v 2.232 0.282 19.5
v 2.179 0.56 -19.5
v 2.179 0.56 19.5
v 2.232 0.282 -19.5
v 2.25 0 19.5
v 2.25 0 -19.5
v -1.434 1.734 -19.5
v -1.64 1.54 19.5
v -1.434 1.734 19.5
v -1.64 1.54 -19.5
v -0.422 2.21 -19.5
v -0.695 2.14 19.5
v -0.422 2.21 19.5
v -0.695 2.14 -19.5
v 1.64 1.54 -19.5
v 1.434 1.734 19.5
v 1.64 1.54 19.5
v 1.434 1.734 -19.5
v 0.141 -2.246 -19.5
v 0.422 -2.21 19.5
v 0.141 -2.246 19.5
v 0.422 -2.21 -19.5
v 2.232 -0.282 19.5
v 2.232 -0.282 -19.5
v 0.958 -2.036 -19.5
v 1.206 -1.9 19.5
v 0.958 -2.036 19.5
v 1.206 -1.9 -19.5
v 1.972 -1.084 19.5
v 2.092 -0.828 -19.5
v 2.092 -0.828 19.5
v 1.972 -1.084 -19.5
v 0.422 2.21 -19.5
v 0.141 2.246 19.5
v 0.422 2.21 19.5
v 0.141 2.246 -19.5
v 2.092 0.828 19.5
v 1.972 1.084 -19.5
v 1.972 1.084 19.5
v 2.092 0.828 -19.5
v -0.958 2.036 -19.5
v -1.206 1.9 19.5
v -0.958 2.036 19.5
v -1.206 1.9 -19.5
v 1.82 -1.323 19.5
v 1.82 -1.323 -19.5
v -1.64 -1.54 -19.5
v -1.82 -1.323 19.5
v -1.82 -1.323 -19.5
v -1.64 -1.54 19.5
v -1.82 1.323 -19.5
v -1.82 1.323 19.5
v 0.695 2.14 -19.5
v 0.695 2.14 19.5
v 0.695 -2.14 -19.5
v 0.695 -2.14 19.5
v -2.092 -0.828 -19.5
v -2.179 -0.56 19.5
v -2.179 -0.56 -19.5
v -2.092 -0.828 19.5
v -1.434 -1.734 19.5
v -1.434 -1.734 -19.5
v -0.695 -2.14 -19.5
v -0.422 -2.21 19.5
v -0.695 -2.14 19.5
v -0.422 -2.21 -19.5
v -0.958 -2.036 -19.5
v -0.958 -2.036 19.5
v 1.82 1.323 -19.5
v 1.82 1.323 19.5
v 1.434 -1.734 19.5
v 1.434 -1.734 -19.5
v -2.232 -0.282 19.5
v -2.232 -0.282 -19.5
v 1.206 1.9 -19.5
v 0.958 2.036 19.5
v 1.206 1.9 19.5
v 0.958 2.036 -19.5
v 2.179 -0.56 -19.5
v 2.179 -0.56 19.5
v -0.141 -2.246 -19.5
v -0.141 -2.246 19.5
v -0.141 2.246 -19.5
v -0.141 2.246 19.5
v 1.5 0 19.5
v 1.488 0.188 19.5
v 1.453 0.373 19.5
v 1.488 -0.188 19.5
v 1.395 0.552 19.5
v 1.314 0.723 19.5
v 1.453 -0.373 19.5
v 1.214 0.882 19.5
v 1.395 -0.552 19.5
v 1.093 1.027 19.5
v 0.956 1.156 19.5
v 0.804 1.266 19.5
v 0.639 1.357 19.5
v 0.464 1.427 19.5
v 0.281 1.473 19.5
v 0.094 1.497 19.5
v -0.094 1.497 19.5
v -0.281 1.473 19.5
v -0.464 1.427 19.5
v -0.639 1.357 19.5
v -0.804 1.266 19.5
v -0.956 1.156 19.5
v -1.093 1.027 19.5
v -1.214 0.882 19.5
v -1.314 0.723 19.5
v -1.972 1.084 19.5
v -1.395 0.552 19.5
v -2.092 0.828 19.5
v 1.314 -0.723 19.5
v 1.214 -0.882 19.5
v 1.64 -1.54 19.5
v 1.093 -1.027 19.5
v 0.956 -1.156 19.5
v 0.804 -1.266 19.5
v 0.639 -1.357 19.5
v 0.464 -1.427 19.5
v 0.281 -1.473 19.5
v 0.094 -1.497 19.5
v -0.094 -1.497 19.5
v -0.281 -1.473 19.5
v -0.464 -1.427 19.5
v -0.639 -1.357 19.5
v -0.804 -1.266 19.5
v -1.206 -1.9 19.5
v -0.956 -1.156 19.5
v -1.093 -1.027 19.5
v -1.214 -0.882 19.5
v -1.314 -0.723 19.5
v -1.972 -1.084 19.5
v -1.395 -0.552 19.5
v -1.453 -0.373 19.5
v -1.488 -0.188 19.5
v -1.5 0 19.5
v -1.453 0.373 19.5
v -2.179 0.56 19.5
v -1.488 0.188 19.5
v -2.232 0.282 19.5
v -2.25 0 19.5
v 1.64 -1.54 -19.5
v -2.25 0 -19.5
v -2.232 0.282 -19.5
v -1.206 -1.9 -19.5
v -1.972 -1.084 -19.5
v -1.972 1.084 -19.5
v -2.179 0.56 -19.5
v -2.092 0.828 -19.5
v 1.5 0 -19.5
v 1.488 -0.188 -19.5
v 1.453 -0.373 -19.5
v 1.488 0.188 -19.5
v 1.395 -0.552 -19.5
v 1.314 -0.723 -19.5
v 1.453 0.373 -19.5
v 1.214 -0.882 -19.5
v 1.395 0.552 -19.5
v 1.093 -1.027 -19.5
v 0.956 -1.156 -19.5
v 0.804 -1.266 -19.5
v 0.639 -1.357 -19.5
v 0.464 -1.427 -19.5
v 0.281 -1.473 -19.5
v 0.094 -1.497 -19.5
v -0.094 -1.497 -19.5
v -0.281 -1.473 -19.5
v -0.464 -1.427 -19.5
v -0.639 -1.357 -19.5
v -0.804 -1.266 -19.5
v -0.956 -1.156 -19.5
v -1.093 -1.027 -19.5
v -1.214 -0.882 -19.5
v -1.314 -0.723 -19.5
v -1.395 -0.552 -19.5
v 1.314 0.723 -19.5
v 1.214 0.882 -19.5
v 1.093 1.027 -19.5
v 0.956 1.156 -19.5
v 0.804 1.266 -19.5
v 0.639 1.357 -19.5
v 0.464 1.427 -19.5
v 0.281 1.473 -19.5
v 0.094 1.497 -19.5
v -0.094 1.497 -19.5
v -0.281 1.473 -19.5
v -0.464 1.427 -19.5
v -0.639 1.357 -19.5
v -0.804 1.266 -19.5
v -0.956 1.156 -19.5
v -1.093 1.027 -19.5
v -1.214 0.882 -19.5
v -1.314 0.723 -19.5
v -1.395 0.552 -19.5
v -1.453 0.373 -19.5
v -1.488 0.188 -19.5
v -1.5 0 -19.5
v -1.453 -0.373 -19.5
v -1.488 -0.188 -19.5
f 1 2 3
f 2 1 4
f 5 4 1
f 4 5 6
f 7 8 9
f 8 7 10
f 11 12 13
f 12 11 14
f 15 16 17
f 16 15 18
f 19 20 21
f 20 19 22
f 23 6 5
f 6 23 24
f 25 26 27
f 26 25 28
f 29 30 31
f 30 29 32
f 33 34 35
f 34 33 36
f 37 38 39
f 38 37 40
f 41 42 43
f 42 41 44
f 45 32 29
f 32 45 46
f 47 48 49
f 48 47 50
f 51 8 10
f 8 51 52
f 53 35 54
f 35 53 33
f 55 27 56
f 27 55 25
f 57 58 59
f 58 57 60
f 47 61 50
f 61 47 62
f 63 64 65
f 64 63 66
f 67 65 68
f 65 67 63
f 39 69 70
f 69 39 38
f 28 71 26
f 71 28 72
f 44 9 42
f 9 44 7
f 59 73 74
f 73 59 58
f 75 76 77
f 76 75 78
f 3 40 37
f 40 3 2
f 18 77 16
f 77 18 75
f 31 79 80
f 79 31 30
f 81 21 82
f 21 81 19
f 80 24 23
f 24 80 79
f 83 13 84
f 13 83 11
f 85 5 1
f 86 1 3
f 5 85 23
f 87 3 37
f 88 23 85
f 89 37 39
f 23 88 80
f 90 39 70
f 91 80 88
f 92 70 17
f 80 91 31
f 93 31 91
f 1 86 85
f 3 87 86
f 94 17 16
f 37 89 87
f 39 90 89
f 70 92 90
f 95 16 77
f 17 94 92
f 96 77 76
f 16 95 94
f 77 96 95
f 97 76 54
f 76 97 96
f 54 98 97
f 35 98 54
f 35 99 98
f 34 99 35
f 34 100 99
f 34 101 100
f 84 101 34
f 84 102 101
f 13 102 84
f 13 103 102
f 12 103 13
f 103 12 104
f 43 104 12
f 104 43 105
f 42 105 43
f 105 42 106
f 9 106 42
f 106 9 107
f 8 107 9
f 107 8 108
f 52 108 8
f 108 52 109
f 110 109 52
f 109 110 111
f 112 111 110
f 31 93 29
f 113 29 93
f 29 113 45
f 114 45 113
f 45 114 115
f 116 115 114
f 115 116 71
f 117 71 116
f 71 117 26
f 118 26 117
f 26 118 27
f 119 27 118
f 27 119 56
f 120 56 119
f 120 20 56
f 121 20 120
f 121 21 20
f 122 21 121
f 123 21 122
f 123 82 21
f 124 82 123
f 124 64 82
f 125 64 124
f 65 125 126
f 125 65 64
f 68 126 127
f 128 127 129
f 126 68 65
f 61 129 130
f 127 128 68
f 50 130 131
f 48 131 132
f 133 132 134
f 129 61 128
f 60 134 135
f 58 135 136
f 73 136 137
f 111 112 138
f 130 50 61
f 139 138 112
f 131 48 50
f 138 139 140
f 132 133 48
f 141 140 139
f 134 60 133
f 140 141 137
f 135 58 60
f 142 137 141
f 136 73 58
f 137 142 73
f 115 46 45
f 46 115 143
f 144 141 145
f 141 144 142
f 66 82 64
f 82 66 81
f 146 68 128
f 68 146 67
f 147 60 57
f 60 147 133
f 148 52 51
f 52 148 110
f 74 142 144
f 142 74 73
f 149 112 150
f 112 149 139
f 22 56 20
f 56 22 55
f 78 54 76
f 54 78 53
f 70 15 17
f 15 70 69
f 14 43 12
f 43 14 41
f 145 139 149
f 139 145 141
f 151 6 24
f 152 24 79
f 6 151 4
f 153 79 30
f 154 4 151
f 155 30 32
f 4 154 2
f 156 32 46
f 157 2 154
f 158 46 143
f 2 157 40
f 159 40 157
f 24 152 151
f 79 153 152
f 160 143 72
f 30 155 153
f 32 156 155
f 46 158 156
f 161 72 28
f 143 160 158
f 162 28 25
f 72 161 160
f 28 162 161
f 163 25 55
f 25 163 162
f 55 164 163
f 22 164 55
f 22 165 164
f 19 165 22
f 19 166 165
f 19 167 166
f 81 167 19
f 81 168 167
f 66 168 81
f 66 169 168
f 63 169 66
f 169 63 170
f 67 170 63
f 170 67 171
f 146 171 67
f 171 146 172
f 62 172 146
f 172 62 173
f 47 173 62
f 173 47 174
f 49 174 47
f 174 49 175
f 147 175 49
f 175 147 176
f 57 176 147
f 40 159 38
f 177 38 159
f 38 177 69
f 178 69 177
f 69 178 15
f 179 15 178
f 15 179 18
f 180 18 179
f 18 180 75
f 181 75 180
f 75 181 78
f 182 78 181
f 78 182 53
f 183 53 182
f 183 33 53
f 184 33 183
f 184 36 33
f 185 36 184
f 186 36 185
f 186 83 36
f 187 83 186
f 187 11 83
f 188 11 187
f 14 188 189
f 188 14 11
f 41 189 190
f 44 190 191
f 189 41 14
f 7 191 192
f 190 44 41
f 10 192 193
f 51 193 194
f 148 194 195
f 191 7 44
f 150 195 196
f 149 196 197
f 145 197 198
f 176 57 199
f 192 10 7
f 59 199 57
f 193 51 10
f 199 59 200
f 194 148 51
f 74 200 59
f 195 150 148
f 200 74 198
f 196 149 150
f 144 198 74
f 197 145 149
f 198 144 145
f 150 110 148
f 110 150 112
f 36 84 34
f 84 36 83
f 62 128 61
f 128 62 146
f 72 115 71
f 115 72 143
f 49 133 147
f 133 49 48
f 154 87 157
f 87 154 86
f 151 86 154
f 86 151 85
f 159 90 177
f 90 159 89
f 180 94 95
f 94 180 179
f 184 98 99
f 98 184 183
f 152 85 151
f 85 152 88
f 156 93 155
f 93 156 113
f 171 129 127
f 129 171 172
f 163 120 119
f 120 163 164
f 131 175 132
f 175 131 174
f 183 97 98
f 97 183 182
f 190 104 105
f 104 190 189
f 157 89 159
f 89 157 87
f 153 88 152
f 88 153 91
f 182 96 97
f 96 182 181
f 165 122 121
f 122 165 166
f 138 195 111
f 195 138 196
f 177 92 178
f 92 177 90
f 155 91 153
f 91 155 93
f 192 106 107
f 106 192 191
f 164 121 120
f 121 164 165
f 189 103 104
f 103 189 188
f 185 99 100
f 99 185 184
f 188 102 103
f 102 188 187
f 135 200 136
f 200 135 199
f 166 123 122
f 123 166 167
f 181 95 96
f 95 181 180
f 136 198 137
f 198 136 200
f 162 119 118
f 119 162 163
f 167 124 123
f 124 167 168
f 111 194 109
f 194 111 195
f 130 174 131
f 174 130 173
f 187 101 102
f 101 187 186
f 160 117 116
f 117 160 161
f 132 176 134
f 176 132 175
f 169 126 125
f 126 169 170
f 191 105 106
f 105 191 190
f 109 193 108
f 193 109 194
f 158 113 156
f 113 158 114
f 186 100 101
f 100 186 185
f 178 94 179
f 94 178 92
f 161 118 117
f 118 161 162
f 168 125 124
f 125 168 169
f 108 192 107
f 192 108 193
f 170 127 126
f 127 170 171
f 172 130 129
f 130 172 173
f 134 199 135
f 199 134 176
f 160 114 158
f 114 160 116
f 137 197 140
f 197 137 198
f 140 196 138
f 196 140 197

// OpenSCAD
$fn = 50;


difference() {
	union() {
		translate(v = [0, 0, -19.5000000000]) {
			cylinder(h = 39, r = 2.2500000000);
		}
	}
	union() {
		translate(v = [0, 0, -100.0000000000]) {
			cylinder(h = 200, r = 1.5000000000);
		}
	}
}
